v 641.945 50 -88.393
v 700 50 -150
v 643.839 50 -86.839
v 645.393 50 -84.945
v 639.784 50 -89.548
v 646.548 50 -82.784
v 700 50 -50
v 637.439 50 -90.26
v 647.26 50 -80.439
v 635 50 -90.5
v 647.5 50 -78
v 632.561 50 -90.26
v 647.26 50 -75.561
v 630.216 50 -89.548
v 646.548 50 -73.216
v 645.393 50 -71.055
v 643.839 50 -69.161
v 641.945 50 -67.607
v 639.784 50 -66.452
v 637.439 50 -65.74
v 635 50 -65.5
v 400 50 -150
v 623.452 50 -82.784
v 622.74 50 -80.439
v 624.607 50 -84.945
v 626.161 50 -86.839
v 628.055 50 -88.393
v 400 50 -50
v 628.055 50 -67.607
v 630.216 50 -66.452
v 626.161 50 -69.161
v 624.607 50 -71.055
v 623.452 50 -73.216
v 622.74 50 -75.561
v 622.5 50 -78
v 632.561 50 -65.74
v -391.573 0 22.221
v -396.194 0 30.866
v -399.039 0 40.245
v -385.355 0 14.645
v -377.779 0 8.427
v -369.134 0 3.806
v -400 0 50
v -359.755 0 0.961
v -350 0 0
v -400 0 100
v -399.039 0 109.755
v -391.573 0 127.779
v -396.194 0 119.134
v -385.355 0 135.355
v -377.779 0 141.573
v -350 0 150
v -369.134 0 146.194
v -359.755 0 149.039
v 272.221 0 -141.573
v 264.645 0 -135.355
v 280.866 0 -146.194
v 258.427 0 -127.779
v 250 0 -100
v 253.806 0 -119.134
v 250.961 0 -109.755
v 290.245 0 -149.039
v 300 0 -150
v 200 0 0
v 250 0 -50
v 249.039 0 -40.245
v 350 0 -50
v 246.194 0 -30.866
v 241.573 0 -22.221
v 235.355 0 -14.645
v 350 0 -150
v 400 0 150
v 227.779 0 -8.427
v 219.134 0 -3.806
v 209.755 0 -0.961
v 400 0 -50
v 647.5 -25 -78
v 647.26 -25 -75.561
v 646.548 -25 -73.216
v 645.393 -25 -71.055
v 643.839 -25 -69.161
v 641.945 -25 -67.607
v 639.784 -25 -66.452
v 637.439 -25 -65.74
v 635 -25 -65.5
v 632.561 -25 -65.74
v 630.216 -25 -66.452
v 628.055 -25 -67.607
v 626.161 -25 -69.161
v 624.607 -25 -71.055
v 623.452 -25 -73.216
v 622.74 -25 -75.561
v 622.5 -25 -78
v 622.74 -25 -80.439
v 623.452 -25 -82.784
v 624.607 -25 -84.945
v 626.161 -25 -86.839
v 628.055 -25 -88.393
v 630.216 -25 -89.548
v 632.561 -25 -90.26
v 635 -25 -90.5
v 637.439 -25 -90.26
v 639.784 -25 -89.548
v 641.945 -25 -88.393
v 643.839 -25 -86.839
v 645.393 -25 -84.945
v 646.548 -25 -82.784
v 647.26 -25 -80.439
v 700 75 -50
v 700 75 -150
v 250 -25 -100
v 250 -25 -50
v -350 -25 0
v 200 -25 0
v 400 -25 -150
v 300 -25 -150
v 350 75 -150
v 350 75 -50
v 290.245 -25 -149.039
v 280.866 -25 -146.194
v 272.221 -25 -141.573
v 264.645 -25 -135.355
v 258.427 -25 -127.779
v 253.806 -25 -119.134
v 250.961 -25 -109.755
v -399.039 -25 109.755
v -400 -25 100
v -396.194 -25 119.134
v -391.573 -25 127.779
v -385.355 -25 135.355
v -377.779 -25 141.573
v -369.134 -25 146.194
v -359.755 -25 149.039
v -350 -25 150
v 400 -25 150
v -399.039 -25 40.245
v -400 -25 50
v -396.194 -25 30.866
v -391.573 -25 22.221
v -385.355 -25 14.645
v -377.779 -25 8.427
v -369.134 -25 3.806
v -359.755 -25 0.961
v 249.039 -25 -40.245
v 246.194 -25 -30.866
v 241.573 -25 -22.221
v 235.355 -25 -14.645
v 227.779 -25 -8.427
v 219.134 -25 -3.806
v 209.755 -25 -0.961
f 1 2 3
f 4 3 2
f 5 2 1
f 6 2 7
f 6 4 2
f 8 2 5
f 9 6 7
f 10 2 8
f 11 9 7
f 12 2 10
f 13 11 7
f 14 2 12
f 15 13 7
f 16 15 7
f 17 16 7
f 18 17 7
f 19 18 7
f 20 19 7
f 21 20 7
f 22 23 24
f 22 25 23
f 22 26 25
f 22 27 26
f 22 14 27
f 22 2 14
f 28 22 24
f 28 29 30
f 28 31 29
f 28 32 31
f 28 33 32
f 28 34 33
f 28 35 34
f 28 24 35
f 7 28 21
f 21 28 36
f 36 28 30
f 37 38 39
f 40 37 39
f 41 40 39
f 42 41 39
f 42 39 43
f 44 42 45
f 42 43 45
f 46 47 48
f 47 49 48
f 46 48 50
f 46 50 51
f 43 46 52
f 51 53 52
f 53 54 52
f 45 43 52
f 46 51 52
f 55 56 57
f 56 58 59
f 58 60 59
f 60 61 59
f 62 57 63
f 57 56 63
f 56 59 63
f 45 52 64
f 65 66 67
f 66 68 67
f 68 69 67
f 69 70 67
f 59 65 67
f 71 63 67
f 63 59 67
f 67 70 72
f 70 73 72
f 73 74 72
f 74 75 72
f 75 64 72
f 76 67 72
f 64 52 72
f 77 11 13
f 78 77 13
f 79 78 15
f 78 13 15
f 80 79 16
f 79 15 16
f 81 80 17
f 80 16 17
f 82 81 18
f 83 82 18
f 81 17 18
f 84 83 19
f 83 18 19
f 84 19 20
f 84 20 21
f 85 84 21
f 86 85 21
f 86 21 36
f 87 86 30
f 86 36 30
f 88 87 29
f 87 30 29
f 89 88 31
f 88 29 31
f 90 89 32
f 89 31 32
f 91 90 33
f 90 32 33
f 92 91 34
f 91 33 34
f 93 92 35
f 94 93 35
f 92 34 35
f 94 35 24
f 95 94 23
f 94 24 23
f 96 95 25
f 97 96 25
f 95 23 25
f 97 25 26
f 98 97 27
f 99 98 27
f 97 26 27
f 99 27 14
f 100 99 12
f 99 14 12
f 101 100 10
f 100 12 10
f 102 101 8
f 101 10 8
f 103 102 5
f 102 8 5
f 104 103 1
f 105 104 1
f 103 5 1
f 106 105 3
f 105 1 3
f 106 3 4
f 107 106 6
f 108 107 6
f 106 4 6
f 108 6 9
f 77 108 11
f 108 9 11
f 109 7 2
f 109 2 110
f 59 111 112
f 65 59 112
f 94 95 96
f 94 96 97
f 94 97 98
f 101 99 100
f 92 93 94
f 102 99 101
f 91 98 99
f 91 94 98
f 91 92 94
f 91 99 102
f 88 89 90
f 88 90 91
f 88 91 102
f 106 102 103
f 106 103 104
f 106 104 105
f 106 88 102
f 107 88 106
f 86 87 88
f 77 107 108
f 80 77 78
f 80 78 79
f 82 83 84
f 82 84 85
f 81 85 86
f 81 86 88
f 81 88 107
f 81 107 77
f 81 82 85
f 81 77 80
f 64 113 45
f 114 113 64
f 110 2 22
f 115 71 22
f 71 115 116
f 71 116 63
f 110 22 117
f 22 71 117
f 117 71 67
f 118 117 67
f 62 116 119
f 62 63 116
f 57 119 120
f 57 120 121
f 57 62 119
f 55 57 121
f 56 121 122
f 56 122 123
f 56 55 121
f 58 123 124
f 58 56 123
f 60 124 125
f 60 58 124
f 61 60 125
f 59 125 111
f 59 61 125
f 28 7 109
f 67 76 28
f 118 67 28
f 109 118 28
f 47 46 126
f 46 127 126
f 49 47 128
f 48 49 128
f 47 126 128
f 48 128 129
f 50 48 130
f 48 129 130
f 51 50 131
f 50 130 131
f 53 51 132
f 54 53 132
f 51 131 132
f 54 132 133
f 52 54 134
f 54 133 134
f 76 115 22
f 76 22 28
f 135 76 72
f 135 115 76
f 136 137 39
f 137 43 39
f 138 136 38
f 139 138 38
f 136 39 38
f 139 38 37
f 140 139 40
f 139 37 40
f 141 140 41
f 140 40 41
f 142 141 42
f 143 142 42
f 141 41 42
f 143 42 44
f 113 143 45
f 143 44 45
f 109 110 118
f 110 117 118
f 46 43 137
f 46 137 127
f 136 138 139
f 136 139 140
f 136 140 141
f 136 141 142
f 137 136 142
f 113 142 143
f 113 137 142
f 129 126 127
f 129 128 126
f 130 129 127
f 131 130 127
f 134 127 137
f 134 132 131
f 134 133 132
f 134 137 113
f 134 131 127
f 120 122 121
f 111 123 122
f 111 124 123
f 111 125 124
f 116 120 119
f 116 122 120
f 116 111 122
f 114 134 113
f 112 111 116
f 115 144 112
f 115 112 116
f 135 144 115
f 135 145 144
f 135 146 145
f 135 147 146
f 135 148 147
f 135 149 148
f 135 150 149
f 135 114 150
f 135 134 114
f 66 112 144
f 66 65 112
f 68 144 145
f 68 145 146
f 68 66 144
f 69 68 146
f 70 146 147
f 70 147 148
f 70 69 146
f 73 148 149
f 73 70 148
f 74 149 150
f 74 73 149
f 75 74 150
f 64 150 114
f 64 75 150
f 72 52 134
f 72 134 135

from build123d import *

# Parameters (mm, degrees)
F0_W     = 800
F0_H     = 300
F1_DEPTH = 25
F2_W     = 50
F2_H     = 100
F3_DEPTH = 75
F4_W     = 25
F4_H     = 100
F5_DEPTH = 300
F6_R     = 12.5
F7_DEPTH = 75
F8_W     = 650
F8_H     = 150
F9_DEPTH = 25
F10_R    = 50
F11_R    = 50


with BuildPart() as f1:
    # F0 (on Front) → F1 (new body)
    with BuildSketch(Plane.XZ):
        Rectangle(F0_W, F0_H)
    extrude(amount=F1_DEPTH)

    # F2 (on face) → F3 (join)
    with BuildSketch(Plane(origin=(0, 0, 0), x_dir=(-1, 0, 0), z_dir=(0, 1, 0))):
        with Locations((-375, -100)):
            Rectangle(F2_W, F2_H)
    extrude(amount=F3_DEPTH)

    # F4 (on face) → F5 (join)
    with BuildSketch(Plane.YZ.offset(400)):
        with Locations((62.5, -100)):
            Rectangle(F4_W, F4_H)
    extrude(amount=F5_DEPTH)

    # F6 (on face) → F7 (join)
    with BuildSketch(Plane.XZ.offset(-50)):
        with Locations((635, -78)):
            Circle(F6_R)
    extrude(amount=F7_DEPTH)

    # F8 (on face) → F9 (cut)
    with BuildSketch(Plane.XZ.offset(25)):
        with Locations((-75, -75)):
            Rectangle(F8_W, F8_H)
    extrude(amount=-F9_DEPTH, mode=Mode.SUBTRACT)

    # F10
    f10_edges = [f1.edges().sort_by_distance(p)[0] for p in [
        (-400, -12.5, 0),
        (250, -12.5, 0),
        (250, -12.5, -150),
    ]]
    fillet(f10_edges, radius=F10_R)

    # F11
    f11_edges = [f1.edges().sort_by_distance(p)[0] for p in [
        (-400, -12.5, 150),
    ]]
    fillet(f11_edges, radius=F11_R)


solid = f1.part
